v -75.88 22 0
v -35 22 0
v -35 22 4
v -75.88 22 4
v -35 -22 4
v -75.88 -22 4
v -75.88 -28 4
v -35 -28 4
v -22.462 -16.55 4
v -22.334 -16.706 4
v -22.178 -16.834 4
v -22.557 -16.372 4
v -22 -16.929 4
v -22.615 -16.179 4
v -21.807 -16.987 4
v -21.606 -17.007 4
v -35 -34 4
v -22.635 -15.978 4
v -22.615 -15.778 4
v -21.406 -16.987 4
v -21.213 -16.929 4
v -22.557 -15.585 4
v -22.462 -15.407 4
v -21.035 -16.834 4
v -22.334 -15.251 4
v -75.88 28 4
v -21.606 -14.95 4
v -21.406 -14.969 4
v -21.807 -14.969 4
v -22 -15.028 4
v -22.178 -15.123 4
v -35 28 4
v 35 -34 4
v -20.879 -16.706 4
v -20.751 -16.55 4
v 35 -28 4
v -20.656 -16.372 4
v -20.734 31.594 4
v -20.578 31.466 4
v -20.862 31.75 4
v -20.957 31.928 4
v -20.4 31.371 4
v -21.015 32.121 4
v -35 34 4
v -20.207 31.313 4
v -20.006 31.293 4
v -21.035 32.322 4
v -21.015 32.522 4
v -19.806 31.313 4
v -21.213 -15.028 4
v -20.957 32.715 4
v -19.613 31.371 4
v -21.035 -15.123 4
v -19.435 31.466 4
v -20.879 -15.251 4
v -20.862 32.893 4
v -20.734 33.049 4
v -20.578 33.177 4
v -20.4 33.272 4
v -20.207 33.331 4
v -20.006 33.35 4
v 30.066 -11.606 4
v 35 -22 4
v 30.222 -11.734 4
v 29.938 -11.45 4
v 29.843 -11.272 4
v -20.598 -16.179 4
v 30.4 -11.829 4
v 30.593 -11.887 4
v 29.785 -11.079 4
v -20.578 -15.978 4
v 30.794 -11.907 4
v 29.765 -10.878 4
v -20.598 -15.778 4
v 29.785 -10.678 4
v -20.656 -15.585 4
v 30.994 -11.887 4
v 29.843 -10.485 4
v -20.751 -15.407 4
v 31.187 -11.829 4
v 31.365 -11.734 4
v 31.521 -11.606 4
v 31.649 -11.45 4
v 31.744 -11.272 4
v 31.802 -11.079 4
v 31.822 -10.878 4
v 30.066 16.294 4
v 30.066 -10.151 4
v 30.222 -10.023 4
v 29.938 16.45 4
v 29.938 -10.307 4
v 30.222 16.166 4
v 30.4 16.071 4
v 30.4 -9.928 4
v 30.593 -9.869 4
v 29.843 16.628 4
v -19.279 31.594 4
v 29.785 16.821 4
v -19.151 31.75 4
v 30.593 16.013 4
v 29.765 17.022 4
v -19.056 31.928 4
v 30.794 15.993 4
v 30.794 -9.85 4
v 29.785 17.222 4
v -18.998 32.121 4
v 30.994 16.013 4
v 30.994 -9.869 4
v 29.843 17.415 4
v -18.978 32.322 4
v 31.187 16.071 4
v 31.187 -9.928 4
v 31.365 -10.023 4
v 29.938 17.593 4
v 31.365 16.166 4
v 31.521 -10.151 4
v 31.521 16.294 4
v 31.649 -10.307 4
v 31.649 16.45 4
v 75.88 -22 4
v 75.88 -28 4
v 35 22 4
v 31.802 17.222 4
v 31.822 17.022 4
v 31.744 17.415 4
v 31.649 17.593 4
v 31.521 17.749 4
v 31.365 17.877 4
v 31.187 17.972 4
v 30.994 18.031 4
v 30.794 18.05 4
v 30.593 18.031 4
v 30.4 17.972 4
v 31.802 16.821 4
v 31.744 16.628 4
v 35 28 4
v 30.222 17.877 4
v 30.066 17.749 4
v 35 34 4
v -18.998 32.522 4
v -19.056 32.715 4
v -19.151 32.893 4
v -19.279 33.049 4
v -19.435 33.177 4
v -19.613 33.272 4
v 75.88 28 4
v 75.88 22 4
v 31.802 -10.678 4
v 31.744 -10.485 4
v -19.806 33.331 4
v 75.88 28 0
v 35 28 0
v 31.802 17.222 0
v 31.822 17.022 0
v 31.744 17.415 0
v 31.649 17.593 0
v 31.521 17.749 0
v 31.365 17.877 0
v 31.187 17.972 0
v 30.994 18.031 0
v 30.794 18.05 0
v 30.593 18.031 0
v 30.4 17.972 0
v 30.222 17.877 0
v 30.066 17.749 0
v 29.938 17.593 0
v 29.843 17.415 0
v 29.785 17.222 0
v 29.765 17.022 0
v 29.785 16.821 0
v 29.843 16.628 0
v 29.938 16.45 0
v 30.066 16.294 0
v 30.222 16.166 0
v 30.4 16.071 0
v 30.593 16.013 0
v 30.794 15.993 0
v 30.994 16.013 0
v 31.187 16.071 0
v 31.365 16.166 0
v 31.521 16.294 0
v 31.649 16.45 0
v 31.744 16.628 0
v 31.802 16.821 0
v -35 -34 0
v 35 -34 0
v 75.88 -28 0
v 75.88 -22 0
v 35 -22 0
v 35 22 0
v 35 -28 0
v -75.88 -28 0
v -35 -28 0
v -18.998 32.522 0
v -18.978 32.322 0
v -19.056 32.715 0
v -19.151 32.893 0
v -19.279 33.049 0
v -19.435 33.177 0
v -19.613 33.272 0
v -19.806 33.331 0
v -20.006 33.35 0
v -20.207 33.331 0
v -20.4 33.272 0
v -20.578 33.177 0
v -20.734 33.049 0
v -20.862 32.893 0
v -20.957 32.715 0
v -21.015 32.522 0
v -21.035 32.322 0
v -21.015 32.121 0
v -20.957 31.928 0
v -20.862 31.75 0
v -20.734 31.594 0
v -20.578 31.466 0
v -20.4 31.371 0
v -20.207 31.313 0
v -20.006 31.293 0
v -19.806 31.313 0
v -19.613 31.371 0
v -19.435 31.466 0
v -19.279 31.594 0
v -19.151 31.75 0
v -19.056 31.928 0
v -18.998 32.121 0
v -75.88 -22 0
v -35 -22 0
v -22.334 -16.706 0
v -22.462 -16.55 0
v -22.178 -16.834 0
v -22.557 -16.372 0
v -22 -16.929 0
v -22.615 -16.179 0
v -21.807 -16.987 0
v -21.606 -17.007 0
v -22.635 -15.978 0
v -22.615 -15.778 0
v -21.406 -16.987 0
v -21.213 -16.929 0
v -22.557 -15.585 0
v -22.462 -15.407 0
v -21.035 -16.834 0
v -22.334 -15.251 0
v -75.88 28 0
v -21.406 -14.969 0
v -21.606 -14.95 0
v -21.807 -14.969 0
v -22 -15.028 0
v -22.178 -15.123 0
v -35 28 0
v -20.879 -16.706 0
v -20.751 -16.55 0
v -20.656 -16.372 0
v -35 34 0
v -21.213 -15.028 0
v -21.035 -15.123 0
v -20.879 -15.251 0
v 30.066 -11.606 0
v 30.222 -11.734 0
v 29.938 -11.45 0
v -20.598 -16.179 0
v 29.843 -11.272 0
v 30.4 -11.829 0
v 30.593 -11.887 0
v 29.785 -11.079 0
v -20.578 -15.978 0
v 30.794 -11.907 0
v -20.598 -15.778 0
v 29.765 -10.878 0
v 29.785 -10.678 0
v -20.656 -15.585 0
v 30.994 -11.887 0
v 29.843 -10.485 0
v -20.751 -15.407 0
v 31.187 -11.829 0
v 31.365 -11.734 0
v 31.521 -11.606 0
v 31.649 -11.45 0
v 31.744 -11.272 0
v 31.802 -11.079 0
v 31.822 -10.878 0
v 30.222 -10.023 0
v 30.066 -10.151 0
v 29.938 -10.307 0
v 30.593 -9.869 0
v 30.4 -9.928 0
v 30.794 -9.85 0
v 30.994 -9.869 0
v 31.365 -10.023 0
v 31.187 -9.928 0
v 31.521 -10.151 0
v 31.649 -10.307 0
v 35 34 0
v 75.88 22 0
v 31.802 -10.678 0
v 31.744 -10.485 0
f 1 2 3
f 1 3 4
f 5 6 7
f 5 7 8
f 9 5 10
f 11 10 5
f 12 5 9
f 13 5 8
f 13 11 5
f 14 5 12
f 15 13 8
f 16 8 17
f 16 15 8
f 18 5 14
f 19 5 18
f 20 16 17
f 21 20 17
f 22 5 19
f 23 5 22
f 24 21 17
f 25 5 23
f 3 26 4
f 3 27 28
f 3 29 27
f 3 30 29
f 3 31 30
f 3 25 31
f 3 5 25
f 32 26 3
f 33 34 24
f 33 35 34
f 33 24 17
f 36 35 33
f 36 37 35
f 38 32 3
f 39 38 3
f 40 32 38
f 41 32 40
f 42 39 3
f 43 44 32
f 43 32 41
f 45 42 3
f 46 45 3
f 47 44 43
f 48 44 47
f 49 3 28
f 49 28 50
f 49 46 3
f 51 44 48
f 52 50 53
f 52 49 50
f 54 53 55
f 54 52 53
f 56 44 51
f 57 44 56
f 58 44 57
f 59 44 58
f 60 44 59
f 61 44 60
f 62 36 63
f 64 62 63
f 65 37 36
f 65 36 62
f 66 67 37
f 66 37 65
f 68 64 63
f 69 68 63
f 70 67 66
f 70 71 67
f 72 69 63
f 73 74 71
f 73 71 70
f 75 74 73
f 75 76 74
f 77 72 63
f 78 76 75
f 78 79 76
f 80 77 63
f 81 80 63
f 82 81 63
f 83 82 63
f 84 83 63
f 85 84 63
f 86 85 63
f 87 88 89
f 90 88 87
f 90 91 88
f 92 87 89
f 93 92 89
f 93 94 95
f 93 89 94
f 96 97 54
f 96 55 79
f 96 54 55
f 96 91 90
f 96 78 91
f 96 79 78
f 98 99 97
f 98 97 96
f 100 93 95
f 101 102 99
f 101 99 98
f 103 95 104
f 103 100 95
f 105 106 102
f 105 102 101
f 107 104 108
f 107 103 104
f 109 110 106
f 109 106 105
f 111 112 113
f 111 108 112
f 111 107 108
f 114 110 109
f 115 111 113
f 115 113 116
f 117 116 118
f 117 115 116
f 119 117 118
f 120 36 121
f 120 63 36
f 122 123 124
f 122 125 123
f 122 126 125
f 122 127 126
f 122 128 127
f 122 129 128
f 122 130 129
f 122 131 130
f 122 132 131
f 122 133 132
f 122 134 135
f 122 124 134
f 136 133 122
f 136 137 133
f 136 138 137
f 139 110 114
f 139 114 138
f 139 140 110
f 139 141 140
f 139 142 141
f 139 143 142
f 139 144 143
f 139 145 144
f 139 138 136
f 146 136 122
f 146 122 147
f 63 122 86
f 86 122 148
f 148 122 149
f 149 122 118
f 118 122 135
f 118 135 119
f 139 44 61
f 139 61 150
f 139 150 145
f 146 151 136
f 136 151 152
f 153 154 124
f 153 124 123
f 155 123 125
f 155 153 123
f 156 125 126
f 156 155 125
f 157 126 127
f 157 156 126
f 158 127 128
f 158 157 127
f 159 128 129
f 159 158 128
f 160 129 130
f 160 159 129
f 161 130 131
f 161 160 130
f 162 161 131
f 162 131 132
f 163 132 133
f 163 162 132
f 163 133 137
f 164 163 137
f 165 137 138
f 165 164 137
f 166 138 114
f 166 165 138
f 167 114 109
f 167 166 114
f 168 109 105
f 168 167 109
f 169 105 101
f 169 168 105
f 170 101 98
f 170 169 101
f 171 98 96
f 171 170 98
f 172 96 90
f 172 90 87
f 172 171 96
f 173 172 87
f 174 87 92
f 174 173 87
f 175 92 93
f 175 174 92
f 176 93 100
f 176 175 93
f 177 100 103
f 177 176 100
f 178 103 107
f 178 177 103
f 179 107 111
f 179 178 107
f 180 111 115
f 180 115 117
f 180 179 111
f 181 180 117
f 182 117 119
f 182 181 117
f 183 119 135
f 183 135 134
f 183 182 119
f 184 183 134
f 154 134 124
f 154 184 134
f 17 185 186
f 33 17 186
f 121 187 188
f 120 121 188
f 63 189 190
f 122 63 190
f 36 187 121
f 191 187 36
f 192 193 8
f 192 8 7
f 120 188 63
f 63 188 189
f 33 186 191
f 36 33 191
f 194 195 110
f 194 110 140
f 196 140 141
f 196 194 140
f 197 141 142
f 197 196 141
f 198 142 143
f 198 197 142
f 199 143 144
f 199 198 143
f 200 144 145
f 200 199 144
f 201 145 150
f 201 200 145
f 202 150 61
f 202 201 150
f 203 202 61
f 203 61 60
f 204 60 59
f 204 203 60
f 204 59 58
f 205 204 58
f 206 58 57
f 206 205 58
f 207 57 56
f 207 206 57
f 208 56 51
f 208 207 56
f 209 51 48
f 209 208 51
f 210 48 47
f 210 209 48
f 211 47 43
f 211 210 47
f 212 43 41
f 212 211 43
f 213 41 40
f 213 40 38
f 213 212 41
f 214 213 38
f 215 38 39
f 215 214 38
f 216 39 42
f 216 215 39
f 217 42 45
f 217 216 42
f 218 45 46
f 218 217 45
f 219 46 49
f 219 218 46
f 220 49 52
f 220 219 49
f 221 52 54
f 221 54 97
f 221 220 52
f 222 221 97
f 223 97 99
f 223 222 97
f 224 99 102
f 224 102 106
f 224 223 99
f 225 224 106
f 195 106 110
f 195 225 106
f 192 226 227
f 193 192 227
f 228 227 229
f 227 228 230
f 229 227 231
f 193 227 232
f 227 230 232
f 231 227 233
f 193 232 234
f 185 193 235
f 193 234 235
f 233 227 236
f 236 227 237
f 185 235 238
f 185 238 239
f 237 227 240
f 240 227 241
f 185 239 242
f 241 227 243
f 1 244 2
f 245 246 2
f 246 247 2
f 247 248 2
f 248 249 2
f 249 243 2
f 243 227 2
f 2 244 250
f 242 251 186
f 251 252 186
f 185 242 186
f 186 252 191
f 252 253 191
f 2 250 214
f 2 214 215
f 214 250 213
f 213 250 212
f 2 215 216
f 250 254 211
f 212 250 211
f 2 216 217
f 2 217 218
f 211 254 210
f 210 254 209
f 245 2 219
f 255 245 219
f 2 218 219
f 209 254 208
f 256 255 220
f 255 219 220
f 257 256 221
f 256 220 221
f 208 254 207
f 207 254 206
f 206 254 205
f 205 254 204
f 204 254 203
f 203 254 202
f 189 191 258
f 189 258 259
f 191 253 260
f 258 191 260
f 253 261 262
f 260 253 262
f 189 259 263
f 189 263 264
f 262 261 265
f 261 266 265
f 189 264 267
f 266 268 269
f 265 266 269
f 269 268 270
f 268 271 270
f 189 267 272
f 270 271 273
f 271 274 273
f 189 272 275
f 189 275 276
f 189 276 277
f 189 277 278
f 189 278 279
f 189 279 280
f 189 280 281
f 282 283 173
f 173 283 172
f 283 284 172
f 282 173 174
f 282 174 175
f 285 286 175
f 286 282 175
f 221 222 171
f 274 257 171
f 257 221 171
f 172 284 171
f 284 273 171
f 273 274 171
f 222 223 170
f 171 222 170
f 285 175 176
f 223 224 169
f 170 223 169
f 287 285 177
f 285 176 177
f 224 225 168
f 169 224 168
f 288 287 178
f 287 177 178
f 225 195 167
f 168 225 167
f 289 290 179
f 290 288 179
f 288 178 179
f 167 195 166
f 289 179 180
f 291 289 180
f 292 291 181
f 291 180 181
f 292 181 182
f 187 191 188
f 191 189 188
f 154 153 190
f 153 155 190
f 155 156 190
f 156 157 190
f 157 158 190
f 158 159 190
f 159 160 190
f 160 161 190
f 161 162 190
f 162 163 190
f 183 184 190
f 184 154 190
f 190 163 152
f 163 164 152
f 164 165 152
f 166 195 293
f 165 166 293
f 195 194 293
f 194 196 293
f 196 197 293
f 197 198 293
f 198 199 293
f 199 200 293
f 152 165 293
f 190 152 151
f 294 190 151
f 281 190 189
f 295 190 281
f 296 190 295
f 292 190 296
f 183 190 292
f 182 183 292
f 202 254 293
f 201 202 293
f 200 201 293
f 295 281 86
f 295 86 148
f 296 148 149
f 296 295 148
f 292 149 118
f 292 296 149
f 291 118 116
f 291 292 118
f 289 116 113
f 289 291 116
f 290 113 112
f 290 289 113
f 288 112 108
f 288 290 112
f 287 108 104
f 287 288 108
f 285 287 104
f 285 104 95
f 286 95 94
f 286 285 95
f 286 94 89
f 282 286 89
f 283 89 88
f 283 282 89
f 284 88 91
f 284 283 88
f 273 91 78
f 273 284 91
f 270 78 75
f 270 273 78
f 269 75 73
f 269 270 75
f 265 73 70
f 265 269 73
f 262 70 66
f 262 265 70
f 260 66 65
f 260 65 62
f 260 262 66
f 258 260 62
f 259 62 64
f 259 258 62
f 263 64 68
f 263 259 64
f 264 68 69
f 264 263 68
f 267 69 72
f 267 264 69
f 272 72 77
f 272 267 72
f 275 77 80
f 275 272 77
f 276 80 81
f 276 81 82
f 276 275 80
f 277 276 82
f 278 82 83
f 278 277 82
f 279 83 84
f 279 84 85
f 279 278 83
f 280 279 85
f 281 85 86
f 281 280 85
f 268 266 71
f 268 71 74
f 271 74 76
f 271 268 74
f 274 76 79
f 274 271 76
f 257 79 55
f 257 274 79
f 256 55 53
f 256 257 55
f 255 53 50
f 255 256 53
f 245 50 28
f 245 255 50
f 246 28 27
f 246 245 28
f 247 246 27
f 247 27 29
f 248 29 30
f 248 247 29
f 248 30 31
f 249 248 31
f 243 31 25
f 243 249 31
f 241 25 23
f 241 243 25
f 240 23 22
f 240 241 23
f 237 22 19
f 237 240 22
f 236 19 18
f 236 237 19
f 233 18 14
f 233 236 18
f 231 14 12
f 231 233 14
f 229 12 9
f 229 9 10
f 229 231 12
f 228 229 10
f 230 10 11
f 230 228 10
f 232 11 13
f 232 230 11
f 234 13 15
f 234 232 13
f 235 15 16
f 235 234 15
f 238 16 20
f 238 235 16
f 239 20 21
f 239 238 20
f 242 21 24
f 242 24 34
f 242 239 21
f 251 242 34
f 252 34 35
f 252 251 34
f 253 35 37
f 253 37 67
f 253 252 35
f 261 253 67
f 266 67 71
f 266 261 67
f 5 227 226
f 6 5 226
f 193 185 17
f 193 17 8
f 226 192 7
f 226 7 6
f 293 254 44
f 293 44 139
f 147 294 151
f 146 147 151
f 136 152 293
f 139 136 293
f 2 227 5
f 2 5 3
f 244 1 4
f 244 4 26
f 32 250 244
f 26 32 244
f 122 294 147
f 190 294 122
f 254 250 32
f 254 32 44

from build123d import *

# Parameters (mm, degrees)
SKETCH1_W           = 70
SKETCH1_H           = 68
SKETCH1_R           = 1.0287
BOSS_EXTRUDE1_DEPTH = 4
SKETCH2_W           = 40.88
SKETCH2_H           = 6
BOSS_EXTRUDE2_DEPTH = 4


with BuildPart() as part:
    # Sketch1 → Boss-Extrude1 (new body)
    with BuildSketch(Plane.XY):
        Rectangle(SKETCH1_W, SKETCH1_H)
        with Locations((-21.606472839, -15.978304245)):
            Circle(SKETCH1_R, mode=Mode.SUBTRACT)
        with Locations((30.793527161, -10.878304245)):
            Circle(SKETCH1_R, mode=Mode.SUBTRACT)
        with Locations((30.793527161, 17.021695755)):
            Circle(SKETCH1_R, mode=Mode.SUBTRACT)
        with Locations((-20.006472839, 32.321695755)):
            Circle(SKETCH1_R, mode=Mode.SUBTRACT)
    extrude(amount=BOSS_EXTRUDE1_DEPTH)

    # Sketch2 → Boss-Extrude2 (add)
    with BuildSketch(Plane(origin=(0, 0, 0), x_dir=(-1, 0, 0), z_dir=(0, 0, -1))):
        with Locations((55.44, 25)):
            Rectangle(SKETCH2_W, SKETCH2_H)
        with Locations((-55.44, 25)):
            Rectangle(SKETCH2_W, SKETCH2_H)
        with Locations((-55.44, -25)):
            Rectangle(SKETCH2_W, SKETCH2_H)
        with Locations((55.44, -25)):
            Rectangle(SKETCH2_W, SKETCH2_H)
    extrude(amount=-BOSS_EXTRUDE2_DEPTH)


solid = part.part
